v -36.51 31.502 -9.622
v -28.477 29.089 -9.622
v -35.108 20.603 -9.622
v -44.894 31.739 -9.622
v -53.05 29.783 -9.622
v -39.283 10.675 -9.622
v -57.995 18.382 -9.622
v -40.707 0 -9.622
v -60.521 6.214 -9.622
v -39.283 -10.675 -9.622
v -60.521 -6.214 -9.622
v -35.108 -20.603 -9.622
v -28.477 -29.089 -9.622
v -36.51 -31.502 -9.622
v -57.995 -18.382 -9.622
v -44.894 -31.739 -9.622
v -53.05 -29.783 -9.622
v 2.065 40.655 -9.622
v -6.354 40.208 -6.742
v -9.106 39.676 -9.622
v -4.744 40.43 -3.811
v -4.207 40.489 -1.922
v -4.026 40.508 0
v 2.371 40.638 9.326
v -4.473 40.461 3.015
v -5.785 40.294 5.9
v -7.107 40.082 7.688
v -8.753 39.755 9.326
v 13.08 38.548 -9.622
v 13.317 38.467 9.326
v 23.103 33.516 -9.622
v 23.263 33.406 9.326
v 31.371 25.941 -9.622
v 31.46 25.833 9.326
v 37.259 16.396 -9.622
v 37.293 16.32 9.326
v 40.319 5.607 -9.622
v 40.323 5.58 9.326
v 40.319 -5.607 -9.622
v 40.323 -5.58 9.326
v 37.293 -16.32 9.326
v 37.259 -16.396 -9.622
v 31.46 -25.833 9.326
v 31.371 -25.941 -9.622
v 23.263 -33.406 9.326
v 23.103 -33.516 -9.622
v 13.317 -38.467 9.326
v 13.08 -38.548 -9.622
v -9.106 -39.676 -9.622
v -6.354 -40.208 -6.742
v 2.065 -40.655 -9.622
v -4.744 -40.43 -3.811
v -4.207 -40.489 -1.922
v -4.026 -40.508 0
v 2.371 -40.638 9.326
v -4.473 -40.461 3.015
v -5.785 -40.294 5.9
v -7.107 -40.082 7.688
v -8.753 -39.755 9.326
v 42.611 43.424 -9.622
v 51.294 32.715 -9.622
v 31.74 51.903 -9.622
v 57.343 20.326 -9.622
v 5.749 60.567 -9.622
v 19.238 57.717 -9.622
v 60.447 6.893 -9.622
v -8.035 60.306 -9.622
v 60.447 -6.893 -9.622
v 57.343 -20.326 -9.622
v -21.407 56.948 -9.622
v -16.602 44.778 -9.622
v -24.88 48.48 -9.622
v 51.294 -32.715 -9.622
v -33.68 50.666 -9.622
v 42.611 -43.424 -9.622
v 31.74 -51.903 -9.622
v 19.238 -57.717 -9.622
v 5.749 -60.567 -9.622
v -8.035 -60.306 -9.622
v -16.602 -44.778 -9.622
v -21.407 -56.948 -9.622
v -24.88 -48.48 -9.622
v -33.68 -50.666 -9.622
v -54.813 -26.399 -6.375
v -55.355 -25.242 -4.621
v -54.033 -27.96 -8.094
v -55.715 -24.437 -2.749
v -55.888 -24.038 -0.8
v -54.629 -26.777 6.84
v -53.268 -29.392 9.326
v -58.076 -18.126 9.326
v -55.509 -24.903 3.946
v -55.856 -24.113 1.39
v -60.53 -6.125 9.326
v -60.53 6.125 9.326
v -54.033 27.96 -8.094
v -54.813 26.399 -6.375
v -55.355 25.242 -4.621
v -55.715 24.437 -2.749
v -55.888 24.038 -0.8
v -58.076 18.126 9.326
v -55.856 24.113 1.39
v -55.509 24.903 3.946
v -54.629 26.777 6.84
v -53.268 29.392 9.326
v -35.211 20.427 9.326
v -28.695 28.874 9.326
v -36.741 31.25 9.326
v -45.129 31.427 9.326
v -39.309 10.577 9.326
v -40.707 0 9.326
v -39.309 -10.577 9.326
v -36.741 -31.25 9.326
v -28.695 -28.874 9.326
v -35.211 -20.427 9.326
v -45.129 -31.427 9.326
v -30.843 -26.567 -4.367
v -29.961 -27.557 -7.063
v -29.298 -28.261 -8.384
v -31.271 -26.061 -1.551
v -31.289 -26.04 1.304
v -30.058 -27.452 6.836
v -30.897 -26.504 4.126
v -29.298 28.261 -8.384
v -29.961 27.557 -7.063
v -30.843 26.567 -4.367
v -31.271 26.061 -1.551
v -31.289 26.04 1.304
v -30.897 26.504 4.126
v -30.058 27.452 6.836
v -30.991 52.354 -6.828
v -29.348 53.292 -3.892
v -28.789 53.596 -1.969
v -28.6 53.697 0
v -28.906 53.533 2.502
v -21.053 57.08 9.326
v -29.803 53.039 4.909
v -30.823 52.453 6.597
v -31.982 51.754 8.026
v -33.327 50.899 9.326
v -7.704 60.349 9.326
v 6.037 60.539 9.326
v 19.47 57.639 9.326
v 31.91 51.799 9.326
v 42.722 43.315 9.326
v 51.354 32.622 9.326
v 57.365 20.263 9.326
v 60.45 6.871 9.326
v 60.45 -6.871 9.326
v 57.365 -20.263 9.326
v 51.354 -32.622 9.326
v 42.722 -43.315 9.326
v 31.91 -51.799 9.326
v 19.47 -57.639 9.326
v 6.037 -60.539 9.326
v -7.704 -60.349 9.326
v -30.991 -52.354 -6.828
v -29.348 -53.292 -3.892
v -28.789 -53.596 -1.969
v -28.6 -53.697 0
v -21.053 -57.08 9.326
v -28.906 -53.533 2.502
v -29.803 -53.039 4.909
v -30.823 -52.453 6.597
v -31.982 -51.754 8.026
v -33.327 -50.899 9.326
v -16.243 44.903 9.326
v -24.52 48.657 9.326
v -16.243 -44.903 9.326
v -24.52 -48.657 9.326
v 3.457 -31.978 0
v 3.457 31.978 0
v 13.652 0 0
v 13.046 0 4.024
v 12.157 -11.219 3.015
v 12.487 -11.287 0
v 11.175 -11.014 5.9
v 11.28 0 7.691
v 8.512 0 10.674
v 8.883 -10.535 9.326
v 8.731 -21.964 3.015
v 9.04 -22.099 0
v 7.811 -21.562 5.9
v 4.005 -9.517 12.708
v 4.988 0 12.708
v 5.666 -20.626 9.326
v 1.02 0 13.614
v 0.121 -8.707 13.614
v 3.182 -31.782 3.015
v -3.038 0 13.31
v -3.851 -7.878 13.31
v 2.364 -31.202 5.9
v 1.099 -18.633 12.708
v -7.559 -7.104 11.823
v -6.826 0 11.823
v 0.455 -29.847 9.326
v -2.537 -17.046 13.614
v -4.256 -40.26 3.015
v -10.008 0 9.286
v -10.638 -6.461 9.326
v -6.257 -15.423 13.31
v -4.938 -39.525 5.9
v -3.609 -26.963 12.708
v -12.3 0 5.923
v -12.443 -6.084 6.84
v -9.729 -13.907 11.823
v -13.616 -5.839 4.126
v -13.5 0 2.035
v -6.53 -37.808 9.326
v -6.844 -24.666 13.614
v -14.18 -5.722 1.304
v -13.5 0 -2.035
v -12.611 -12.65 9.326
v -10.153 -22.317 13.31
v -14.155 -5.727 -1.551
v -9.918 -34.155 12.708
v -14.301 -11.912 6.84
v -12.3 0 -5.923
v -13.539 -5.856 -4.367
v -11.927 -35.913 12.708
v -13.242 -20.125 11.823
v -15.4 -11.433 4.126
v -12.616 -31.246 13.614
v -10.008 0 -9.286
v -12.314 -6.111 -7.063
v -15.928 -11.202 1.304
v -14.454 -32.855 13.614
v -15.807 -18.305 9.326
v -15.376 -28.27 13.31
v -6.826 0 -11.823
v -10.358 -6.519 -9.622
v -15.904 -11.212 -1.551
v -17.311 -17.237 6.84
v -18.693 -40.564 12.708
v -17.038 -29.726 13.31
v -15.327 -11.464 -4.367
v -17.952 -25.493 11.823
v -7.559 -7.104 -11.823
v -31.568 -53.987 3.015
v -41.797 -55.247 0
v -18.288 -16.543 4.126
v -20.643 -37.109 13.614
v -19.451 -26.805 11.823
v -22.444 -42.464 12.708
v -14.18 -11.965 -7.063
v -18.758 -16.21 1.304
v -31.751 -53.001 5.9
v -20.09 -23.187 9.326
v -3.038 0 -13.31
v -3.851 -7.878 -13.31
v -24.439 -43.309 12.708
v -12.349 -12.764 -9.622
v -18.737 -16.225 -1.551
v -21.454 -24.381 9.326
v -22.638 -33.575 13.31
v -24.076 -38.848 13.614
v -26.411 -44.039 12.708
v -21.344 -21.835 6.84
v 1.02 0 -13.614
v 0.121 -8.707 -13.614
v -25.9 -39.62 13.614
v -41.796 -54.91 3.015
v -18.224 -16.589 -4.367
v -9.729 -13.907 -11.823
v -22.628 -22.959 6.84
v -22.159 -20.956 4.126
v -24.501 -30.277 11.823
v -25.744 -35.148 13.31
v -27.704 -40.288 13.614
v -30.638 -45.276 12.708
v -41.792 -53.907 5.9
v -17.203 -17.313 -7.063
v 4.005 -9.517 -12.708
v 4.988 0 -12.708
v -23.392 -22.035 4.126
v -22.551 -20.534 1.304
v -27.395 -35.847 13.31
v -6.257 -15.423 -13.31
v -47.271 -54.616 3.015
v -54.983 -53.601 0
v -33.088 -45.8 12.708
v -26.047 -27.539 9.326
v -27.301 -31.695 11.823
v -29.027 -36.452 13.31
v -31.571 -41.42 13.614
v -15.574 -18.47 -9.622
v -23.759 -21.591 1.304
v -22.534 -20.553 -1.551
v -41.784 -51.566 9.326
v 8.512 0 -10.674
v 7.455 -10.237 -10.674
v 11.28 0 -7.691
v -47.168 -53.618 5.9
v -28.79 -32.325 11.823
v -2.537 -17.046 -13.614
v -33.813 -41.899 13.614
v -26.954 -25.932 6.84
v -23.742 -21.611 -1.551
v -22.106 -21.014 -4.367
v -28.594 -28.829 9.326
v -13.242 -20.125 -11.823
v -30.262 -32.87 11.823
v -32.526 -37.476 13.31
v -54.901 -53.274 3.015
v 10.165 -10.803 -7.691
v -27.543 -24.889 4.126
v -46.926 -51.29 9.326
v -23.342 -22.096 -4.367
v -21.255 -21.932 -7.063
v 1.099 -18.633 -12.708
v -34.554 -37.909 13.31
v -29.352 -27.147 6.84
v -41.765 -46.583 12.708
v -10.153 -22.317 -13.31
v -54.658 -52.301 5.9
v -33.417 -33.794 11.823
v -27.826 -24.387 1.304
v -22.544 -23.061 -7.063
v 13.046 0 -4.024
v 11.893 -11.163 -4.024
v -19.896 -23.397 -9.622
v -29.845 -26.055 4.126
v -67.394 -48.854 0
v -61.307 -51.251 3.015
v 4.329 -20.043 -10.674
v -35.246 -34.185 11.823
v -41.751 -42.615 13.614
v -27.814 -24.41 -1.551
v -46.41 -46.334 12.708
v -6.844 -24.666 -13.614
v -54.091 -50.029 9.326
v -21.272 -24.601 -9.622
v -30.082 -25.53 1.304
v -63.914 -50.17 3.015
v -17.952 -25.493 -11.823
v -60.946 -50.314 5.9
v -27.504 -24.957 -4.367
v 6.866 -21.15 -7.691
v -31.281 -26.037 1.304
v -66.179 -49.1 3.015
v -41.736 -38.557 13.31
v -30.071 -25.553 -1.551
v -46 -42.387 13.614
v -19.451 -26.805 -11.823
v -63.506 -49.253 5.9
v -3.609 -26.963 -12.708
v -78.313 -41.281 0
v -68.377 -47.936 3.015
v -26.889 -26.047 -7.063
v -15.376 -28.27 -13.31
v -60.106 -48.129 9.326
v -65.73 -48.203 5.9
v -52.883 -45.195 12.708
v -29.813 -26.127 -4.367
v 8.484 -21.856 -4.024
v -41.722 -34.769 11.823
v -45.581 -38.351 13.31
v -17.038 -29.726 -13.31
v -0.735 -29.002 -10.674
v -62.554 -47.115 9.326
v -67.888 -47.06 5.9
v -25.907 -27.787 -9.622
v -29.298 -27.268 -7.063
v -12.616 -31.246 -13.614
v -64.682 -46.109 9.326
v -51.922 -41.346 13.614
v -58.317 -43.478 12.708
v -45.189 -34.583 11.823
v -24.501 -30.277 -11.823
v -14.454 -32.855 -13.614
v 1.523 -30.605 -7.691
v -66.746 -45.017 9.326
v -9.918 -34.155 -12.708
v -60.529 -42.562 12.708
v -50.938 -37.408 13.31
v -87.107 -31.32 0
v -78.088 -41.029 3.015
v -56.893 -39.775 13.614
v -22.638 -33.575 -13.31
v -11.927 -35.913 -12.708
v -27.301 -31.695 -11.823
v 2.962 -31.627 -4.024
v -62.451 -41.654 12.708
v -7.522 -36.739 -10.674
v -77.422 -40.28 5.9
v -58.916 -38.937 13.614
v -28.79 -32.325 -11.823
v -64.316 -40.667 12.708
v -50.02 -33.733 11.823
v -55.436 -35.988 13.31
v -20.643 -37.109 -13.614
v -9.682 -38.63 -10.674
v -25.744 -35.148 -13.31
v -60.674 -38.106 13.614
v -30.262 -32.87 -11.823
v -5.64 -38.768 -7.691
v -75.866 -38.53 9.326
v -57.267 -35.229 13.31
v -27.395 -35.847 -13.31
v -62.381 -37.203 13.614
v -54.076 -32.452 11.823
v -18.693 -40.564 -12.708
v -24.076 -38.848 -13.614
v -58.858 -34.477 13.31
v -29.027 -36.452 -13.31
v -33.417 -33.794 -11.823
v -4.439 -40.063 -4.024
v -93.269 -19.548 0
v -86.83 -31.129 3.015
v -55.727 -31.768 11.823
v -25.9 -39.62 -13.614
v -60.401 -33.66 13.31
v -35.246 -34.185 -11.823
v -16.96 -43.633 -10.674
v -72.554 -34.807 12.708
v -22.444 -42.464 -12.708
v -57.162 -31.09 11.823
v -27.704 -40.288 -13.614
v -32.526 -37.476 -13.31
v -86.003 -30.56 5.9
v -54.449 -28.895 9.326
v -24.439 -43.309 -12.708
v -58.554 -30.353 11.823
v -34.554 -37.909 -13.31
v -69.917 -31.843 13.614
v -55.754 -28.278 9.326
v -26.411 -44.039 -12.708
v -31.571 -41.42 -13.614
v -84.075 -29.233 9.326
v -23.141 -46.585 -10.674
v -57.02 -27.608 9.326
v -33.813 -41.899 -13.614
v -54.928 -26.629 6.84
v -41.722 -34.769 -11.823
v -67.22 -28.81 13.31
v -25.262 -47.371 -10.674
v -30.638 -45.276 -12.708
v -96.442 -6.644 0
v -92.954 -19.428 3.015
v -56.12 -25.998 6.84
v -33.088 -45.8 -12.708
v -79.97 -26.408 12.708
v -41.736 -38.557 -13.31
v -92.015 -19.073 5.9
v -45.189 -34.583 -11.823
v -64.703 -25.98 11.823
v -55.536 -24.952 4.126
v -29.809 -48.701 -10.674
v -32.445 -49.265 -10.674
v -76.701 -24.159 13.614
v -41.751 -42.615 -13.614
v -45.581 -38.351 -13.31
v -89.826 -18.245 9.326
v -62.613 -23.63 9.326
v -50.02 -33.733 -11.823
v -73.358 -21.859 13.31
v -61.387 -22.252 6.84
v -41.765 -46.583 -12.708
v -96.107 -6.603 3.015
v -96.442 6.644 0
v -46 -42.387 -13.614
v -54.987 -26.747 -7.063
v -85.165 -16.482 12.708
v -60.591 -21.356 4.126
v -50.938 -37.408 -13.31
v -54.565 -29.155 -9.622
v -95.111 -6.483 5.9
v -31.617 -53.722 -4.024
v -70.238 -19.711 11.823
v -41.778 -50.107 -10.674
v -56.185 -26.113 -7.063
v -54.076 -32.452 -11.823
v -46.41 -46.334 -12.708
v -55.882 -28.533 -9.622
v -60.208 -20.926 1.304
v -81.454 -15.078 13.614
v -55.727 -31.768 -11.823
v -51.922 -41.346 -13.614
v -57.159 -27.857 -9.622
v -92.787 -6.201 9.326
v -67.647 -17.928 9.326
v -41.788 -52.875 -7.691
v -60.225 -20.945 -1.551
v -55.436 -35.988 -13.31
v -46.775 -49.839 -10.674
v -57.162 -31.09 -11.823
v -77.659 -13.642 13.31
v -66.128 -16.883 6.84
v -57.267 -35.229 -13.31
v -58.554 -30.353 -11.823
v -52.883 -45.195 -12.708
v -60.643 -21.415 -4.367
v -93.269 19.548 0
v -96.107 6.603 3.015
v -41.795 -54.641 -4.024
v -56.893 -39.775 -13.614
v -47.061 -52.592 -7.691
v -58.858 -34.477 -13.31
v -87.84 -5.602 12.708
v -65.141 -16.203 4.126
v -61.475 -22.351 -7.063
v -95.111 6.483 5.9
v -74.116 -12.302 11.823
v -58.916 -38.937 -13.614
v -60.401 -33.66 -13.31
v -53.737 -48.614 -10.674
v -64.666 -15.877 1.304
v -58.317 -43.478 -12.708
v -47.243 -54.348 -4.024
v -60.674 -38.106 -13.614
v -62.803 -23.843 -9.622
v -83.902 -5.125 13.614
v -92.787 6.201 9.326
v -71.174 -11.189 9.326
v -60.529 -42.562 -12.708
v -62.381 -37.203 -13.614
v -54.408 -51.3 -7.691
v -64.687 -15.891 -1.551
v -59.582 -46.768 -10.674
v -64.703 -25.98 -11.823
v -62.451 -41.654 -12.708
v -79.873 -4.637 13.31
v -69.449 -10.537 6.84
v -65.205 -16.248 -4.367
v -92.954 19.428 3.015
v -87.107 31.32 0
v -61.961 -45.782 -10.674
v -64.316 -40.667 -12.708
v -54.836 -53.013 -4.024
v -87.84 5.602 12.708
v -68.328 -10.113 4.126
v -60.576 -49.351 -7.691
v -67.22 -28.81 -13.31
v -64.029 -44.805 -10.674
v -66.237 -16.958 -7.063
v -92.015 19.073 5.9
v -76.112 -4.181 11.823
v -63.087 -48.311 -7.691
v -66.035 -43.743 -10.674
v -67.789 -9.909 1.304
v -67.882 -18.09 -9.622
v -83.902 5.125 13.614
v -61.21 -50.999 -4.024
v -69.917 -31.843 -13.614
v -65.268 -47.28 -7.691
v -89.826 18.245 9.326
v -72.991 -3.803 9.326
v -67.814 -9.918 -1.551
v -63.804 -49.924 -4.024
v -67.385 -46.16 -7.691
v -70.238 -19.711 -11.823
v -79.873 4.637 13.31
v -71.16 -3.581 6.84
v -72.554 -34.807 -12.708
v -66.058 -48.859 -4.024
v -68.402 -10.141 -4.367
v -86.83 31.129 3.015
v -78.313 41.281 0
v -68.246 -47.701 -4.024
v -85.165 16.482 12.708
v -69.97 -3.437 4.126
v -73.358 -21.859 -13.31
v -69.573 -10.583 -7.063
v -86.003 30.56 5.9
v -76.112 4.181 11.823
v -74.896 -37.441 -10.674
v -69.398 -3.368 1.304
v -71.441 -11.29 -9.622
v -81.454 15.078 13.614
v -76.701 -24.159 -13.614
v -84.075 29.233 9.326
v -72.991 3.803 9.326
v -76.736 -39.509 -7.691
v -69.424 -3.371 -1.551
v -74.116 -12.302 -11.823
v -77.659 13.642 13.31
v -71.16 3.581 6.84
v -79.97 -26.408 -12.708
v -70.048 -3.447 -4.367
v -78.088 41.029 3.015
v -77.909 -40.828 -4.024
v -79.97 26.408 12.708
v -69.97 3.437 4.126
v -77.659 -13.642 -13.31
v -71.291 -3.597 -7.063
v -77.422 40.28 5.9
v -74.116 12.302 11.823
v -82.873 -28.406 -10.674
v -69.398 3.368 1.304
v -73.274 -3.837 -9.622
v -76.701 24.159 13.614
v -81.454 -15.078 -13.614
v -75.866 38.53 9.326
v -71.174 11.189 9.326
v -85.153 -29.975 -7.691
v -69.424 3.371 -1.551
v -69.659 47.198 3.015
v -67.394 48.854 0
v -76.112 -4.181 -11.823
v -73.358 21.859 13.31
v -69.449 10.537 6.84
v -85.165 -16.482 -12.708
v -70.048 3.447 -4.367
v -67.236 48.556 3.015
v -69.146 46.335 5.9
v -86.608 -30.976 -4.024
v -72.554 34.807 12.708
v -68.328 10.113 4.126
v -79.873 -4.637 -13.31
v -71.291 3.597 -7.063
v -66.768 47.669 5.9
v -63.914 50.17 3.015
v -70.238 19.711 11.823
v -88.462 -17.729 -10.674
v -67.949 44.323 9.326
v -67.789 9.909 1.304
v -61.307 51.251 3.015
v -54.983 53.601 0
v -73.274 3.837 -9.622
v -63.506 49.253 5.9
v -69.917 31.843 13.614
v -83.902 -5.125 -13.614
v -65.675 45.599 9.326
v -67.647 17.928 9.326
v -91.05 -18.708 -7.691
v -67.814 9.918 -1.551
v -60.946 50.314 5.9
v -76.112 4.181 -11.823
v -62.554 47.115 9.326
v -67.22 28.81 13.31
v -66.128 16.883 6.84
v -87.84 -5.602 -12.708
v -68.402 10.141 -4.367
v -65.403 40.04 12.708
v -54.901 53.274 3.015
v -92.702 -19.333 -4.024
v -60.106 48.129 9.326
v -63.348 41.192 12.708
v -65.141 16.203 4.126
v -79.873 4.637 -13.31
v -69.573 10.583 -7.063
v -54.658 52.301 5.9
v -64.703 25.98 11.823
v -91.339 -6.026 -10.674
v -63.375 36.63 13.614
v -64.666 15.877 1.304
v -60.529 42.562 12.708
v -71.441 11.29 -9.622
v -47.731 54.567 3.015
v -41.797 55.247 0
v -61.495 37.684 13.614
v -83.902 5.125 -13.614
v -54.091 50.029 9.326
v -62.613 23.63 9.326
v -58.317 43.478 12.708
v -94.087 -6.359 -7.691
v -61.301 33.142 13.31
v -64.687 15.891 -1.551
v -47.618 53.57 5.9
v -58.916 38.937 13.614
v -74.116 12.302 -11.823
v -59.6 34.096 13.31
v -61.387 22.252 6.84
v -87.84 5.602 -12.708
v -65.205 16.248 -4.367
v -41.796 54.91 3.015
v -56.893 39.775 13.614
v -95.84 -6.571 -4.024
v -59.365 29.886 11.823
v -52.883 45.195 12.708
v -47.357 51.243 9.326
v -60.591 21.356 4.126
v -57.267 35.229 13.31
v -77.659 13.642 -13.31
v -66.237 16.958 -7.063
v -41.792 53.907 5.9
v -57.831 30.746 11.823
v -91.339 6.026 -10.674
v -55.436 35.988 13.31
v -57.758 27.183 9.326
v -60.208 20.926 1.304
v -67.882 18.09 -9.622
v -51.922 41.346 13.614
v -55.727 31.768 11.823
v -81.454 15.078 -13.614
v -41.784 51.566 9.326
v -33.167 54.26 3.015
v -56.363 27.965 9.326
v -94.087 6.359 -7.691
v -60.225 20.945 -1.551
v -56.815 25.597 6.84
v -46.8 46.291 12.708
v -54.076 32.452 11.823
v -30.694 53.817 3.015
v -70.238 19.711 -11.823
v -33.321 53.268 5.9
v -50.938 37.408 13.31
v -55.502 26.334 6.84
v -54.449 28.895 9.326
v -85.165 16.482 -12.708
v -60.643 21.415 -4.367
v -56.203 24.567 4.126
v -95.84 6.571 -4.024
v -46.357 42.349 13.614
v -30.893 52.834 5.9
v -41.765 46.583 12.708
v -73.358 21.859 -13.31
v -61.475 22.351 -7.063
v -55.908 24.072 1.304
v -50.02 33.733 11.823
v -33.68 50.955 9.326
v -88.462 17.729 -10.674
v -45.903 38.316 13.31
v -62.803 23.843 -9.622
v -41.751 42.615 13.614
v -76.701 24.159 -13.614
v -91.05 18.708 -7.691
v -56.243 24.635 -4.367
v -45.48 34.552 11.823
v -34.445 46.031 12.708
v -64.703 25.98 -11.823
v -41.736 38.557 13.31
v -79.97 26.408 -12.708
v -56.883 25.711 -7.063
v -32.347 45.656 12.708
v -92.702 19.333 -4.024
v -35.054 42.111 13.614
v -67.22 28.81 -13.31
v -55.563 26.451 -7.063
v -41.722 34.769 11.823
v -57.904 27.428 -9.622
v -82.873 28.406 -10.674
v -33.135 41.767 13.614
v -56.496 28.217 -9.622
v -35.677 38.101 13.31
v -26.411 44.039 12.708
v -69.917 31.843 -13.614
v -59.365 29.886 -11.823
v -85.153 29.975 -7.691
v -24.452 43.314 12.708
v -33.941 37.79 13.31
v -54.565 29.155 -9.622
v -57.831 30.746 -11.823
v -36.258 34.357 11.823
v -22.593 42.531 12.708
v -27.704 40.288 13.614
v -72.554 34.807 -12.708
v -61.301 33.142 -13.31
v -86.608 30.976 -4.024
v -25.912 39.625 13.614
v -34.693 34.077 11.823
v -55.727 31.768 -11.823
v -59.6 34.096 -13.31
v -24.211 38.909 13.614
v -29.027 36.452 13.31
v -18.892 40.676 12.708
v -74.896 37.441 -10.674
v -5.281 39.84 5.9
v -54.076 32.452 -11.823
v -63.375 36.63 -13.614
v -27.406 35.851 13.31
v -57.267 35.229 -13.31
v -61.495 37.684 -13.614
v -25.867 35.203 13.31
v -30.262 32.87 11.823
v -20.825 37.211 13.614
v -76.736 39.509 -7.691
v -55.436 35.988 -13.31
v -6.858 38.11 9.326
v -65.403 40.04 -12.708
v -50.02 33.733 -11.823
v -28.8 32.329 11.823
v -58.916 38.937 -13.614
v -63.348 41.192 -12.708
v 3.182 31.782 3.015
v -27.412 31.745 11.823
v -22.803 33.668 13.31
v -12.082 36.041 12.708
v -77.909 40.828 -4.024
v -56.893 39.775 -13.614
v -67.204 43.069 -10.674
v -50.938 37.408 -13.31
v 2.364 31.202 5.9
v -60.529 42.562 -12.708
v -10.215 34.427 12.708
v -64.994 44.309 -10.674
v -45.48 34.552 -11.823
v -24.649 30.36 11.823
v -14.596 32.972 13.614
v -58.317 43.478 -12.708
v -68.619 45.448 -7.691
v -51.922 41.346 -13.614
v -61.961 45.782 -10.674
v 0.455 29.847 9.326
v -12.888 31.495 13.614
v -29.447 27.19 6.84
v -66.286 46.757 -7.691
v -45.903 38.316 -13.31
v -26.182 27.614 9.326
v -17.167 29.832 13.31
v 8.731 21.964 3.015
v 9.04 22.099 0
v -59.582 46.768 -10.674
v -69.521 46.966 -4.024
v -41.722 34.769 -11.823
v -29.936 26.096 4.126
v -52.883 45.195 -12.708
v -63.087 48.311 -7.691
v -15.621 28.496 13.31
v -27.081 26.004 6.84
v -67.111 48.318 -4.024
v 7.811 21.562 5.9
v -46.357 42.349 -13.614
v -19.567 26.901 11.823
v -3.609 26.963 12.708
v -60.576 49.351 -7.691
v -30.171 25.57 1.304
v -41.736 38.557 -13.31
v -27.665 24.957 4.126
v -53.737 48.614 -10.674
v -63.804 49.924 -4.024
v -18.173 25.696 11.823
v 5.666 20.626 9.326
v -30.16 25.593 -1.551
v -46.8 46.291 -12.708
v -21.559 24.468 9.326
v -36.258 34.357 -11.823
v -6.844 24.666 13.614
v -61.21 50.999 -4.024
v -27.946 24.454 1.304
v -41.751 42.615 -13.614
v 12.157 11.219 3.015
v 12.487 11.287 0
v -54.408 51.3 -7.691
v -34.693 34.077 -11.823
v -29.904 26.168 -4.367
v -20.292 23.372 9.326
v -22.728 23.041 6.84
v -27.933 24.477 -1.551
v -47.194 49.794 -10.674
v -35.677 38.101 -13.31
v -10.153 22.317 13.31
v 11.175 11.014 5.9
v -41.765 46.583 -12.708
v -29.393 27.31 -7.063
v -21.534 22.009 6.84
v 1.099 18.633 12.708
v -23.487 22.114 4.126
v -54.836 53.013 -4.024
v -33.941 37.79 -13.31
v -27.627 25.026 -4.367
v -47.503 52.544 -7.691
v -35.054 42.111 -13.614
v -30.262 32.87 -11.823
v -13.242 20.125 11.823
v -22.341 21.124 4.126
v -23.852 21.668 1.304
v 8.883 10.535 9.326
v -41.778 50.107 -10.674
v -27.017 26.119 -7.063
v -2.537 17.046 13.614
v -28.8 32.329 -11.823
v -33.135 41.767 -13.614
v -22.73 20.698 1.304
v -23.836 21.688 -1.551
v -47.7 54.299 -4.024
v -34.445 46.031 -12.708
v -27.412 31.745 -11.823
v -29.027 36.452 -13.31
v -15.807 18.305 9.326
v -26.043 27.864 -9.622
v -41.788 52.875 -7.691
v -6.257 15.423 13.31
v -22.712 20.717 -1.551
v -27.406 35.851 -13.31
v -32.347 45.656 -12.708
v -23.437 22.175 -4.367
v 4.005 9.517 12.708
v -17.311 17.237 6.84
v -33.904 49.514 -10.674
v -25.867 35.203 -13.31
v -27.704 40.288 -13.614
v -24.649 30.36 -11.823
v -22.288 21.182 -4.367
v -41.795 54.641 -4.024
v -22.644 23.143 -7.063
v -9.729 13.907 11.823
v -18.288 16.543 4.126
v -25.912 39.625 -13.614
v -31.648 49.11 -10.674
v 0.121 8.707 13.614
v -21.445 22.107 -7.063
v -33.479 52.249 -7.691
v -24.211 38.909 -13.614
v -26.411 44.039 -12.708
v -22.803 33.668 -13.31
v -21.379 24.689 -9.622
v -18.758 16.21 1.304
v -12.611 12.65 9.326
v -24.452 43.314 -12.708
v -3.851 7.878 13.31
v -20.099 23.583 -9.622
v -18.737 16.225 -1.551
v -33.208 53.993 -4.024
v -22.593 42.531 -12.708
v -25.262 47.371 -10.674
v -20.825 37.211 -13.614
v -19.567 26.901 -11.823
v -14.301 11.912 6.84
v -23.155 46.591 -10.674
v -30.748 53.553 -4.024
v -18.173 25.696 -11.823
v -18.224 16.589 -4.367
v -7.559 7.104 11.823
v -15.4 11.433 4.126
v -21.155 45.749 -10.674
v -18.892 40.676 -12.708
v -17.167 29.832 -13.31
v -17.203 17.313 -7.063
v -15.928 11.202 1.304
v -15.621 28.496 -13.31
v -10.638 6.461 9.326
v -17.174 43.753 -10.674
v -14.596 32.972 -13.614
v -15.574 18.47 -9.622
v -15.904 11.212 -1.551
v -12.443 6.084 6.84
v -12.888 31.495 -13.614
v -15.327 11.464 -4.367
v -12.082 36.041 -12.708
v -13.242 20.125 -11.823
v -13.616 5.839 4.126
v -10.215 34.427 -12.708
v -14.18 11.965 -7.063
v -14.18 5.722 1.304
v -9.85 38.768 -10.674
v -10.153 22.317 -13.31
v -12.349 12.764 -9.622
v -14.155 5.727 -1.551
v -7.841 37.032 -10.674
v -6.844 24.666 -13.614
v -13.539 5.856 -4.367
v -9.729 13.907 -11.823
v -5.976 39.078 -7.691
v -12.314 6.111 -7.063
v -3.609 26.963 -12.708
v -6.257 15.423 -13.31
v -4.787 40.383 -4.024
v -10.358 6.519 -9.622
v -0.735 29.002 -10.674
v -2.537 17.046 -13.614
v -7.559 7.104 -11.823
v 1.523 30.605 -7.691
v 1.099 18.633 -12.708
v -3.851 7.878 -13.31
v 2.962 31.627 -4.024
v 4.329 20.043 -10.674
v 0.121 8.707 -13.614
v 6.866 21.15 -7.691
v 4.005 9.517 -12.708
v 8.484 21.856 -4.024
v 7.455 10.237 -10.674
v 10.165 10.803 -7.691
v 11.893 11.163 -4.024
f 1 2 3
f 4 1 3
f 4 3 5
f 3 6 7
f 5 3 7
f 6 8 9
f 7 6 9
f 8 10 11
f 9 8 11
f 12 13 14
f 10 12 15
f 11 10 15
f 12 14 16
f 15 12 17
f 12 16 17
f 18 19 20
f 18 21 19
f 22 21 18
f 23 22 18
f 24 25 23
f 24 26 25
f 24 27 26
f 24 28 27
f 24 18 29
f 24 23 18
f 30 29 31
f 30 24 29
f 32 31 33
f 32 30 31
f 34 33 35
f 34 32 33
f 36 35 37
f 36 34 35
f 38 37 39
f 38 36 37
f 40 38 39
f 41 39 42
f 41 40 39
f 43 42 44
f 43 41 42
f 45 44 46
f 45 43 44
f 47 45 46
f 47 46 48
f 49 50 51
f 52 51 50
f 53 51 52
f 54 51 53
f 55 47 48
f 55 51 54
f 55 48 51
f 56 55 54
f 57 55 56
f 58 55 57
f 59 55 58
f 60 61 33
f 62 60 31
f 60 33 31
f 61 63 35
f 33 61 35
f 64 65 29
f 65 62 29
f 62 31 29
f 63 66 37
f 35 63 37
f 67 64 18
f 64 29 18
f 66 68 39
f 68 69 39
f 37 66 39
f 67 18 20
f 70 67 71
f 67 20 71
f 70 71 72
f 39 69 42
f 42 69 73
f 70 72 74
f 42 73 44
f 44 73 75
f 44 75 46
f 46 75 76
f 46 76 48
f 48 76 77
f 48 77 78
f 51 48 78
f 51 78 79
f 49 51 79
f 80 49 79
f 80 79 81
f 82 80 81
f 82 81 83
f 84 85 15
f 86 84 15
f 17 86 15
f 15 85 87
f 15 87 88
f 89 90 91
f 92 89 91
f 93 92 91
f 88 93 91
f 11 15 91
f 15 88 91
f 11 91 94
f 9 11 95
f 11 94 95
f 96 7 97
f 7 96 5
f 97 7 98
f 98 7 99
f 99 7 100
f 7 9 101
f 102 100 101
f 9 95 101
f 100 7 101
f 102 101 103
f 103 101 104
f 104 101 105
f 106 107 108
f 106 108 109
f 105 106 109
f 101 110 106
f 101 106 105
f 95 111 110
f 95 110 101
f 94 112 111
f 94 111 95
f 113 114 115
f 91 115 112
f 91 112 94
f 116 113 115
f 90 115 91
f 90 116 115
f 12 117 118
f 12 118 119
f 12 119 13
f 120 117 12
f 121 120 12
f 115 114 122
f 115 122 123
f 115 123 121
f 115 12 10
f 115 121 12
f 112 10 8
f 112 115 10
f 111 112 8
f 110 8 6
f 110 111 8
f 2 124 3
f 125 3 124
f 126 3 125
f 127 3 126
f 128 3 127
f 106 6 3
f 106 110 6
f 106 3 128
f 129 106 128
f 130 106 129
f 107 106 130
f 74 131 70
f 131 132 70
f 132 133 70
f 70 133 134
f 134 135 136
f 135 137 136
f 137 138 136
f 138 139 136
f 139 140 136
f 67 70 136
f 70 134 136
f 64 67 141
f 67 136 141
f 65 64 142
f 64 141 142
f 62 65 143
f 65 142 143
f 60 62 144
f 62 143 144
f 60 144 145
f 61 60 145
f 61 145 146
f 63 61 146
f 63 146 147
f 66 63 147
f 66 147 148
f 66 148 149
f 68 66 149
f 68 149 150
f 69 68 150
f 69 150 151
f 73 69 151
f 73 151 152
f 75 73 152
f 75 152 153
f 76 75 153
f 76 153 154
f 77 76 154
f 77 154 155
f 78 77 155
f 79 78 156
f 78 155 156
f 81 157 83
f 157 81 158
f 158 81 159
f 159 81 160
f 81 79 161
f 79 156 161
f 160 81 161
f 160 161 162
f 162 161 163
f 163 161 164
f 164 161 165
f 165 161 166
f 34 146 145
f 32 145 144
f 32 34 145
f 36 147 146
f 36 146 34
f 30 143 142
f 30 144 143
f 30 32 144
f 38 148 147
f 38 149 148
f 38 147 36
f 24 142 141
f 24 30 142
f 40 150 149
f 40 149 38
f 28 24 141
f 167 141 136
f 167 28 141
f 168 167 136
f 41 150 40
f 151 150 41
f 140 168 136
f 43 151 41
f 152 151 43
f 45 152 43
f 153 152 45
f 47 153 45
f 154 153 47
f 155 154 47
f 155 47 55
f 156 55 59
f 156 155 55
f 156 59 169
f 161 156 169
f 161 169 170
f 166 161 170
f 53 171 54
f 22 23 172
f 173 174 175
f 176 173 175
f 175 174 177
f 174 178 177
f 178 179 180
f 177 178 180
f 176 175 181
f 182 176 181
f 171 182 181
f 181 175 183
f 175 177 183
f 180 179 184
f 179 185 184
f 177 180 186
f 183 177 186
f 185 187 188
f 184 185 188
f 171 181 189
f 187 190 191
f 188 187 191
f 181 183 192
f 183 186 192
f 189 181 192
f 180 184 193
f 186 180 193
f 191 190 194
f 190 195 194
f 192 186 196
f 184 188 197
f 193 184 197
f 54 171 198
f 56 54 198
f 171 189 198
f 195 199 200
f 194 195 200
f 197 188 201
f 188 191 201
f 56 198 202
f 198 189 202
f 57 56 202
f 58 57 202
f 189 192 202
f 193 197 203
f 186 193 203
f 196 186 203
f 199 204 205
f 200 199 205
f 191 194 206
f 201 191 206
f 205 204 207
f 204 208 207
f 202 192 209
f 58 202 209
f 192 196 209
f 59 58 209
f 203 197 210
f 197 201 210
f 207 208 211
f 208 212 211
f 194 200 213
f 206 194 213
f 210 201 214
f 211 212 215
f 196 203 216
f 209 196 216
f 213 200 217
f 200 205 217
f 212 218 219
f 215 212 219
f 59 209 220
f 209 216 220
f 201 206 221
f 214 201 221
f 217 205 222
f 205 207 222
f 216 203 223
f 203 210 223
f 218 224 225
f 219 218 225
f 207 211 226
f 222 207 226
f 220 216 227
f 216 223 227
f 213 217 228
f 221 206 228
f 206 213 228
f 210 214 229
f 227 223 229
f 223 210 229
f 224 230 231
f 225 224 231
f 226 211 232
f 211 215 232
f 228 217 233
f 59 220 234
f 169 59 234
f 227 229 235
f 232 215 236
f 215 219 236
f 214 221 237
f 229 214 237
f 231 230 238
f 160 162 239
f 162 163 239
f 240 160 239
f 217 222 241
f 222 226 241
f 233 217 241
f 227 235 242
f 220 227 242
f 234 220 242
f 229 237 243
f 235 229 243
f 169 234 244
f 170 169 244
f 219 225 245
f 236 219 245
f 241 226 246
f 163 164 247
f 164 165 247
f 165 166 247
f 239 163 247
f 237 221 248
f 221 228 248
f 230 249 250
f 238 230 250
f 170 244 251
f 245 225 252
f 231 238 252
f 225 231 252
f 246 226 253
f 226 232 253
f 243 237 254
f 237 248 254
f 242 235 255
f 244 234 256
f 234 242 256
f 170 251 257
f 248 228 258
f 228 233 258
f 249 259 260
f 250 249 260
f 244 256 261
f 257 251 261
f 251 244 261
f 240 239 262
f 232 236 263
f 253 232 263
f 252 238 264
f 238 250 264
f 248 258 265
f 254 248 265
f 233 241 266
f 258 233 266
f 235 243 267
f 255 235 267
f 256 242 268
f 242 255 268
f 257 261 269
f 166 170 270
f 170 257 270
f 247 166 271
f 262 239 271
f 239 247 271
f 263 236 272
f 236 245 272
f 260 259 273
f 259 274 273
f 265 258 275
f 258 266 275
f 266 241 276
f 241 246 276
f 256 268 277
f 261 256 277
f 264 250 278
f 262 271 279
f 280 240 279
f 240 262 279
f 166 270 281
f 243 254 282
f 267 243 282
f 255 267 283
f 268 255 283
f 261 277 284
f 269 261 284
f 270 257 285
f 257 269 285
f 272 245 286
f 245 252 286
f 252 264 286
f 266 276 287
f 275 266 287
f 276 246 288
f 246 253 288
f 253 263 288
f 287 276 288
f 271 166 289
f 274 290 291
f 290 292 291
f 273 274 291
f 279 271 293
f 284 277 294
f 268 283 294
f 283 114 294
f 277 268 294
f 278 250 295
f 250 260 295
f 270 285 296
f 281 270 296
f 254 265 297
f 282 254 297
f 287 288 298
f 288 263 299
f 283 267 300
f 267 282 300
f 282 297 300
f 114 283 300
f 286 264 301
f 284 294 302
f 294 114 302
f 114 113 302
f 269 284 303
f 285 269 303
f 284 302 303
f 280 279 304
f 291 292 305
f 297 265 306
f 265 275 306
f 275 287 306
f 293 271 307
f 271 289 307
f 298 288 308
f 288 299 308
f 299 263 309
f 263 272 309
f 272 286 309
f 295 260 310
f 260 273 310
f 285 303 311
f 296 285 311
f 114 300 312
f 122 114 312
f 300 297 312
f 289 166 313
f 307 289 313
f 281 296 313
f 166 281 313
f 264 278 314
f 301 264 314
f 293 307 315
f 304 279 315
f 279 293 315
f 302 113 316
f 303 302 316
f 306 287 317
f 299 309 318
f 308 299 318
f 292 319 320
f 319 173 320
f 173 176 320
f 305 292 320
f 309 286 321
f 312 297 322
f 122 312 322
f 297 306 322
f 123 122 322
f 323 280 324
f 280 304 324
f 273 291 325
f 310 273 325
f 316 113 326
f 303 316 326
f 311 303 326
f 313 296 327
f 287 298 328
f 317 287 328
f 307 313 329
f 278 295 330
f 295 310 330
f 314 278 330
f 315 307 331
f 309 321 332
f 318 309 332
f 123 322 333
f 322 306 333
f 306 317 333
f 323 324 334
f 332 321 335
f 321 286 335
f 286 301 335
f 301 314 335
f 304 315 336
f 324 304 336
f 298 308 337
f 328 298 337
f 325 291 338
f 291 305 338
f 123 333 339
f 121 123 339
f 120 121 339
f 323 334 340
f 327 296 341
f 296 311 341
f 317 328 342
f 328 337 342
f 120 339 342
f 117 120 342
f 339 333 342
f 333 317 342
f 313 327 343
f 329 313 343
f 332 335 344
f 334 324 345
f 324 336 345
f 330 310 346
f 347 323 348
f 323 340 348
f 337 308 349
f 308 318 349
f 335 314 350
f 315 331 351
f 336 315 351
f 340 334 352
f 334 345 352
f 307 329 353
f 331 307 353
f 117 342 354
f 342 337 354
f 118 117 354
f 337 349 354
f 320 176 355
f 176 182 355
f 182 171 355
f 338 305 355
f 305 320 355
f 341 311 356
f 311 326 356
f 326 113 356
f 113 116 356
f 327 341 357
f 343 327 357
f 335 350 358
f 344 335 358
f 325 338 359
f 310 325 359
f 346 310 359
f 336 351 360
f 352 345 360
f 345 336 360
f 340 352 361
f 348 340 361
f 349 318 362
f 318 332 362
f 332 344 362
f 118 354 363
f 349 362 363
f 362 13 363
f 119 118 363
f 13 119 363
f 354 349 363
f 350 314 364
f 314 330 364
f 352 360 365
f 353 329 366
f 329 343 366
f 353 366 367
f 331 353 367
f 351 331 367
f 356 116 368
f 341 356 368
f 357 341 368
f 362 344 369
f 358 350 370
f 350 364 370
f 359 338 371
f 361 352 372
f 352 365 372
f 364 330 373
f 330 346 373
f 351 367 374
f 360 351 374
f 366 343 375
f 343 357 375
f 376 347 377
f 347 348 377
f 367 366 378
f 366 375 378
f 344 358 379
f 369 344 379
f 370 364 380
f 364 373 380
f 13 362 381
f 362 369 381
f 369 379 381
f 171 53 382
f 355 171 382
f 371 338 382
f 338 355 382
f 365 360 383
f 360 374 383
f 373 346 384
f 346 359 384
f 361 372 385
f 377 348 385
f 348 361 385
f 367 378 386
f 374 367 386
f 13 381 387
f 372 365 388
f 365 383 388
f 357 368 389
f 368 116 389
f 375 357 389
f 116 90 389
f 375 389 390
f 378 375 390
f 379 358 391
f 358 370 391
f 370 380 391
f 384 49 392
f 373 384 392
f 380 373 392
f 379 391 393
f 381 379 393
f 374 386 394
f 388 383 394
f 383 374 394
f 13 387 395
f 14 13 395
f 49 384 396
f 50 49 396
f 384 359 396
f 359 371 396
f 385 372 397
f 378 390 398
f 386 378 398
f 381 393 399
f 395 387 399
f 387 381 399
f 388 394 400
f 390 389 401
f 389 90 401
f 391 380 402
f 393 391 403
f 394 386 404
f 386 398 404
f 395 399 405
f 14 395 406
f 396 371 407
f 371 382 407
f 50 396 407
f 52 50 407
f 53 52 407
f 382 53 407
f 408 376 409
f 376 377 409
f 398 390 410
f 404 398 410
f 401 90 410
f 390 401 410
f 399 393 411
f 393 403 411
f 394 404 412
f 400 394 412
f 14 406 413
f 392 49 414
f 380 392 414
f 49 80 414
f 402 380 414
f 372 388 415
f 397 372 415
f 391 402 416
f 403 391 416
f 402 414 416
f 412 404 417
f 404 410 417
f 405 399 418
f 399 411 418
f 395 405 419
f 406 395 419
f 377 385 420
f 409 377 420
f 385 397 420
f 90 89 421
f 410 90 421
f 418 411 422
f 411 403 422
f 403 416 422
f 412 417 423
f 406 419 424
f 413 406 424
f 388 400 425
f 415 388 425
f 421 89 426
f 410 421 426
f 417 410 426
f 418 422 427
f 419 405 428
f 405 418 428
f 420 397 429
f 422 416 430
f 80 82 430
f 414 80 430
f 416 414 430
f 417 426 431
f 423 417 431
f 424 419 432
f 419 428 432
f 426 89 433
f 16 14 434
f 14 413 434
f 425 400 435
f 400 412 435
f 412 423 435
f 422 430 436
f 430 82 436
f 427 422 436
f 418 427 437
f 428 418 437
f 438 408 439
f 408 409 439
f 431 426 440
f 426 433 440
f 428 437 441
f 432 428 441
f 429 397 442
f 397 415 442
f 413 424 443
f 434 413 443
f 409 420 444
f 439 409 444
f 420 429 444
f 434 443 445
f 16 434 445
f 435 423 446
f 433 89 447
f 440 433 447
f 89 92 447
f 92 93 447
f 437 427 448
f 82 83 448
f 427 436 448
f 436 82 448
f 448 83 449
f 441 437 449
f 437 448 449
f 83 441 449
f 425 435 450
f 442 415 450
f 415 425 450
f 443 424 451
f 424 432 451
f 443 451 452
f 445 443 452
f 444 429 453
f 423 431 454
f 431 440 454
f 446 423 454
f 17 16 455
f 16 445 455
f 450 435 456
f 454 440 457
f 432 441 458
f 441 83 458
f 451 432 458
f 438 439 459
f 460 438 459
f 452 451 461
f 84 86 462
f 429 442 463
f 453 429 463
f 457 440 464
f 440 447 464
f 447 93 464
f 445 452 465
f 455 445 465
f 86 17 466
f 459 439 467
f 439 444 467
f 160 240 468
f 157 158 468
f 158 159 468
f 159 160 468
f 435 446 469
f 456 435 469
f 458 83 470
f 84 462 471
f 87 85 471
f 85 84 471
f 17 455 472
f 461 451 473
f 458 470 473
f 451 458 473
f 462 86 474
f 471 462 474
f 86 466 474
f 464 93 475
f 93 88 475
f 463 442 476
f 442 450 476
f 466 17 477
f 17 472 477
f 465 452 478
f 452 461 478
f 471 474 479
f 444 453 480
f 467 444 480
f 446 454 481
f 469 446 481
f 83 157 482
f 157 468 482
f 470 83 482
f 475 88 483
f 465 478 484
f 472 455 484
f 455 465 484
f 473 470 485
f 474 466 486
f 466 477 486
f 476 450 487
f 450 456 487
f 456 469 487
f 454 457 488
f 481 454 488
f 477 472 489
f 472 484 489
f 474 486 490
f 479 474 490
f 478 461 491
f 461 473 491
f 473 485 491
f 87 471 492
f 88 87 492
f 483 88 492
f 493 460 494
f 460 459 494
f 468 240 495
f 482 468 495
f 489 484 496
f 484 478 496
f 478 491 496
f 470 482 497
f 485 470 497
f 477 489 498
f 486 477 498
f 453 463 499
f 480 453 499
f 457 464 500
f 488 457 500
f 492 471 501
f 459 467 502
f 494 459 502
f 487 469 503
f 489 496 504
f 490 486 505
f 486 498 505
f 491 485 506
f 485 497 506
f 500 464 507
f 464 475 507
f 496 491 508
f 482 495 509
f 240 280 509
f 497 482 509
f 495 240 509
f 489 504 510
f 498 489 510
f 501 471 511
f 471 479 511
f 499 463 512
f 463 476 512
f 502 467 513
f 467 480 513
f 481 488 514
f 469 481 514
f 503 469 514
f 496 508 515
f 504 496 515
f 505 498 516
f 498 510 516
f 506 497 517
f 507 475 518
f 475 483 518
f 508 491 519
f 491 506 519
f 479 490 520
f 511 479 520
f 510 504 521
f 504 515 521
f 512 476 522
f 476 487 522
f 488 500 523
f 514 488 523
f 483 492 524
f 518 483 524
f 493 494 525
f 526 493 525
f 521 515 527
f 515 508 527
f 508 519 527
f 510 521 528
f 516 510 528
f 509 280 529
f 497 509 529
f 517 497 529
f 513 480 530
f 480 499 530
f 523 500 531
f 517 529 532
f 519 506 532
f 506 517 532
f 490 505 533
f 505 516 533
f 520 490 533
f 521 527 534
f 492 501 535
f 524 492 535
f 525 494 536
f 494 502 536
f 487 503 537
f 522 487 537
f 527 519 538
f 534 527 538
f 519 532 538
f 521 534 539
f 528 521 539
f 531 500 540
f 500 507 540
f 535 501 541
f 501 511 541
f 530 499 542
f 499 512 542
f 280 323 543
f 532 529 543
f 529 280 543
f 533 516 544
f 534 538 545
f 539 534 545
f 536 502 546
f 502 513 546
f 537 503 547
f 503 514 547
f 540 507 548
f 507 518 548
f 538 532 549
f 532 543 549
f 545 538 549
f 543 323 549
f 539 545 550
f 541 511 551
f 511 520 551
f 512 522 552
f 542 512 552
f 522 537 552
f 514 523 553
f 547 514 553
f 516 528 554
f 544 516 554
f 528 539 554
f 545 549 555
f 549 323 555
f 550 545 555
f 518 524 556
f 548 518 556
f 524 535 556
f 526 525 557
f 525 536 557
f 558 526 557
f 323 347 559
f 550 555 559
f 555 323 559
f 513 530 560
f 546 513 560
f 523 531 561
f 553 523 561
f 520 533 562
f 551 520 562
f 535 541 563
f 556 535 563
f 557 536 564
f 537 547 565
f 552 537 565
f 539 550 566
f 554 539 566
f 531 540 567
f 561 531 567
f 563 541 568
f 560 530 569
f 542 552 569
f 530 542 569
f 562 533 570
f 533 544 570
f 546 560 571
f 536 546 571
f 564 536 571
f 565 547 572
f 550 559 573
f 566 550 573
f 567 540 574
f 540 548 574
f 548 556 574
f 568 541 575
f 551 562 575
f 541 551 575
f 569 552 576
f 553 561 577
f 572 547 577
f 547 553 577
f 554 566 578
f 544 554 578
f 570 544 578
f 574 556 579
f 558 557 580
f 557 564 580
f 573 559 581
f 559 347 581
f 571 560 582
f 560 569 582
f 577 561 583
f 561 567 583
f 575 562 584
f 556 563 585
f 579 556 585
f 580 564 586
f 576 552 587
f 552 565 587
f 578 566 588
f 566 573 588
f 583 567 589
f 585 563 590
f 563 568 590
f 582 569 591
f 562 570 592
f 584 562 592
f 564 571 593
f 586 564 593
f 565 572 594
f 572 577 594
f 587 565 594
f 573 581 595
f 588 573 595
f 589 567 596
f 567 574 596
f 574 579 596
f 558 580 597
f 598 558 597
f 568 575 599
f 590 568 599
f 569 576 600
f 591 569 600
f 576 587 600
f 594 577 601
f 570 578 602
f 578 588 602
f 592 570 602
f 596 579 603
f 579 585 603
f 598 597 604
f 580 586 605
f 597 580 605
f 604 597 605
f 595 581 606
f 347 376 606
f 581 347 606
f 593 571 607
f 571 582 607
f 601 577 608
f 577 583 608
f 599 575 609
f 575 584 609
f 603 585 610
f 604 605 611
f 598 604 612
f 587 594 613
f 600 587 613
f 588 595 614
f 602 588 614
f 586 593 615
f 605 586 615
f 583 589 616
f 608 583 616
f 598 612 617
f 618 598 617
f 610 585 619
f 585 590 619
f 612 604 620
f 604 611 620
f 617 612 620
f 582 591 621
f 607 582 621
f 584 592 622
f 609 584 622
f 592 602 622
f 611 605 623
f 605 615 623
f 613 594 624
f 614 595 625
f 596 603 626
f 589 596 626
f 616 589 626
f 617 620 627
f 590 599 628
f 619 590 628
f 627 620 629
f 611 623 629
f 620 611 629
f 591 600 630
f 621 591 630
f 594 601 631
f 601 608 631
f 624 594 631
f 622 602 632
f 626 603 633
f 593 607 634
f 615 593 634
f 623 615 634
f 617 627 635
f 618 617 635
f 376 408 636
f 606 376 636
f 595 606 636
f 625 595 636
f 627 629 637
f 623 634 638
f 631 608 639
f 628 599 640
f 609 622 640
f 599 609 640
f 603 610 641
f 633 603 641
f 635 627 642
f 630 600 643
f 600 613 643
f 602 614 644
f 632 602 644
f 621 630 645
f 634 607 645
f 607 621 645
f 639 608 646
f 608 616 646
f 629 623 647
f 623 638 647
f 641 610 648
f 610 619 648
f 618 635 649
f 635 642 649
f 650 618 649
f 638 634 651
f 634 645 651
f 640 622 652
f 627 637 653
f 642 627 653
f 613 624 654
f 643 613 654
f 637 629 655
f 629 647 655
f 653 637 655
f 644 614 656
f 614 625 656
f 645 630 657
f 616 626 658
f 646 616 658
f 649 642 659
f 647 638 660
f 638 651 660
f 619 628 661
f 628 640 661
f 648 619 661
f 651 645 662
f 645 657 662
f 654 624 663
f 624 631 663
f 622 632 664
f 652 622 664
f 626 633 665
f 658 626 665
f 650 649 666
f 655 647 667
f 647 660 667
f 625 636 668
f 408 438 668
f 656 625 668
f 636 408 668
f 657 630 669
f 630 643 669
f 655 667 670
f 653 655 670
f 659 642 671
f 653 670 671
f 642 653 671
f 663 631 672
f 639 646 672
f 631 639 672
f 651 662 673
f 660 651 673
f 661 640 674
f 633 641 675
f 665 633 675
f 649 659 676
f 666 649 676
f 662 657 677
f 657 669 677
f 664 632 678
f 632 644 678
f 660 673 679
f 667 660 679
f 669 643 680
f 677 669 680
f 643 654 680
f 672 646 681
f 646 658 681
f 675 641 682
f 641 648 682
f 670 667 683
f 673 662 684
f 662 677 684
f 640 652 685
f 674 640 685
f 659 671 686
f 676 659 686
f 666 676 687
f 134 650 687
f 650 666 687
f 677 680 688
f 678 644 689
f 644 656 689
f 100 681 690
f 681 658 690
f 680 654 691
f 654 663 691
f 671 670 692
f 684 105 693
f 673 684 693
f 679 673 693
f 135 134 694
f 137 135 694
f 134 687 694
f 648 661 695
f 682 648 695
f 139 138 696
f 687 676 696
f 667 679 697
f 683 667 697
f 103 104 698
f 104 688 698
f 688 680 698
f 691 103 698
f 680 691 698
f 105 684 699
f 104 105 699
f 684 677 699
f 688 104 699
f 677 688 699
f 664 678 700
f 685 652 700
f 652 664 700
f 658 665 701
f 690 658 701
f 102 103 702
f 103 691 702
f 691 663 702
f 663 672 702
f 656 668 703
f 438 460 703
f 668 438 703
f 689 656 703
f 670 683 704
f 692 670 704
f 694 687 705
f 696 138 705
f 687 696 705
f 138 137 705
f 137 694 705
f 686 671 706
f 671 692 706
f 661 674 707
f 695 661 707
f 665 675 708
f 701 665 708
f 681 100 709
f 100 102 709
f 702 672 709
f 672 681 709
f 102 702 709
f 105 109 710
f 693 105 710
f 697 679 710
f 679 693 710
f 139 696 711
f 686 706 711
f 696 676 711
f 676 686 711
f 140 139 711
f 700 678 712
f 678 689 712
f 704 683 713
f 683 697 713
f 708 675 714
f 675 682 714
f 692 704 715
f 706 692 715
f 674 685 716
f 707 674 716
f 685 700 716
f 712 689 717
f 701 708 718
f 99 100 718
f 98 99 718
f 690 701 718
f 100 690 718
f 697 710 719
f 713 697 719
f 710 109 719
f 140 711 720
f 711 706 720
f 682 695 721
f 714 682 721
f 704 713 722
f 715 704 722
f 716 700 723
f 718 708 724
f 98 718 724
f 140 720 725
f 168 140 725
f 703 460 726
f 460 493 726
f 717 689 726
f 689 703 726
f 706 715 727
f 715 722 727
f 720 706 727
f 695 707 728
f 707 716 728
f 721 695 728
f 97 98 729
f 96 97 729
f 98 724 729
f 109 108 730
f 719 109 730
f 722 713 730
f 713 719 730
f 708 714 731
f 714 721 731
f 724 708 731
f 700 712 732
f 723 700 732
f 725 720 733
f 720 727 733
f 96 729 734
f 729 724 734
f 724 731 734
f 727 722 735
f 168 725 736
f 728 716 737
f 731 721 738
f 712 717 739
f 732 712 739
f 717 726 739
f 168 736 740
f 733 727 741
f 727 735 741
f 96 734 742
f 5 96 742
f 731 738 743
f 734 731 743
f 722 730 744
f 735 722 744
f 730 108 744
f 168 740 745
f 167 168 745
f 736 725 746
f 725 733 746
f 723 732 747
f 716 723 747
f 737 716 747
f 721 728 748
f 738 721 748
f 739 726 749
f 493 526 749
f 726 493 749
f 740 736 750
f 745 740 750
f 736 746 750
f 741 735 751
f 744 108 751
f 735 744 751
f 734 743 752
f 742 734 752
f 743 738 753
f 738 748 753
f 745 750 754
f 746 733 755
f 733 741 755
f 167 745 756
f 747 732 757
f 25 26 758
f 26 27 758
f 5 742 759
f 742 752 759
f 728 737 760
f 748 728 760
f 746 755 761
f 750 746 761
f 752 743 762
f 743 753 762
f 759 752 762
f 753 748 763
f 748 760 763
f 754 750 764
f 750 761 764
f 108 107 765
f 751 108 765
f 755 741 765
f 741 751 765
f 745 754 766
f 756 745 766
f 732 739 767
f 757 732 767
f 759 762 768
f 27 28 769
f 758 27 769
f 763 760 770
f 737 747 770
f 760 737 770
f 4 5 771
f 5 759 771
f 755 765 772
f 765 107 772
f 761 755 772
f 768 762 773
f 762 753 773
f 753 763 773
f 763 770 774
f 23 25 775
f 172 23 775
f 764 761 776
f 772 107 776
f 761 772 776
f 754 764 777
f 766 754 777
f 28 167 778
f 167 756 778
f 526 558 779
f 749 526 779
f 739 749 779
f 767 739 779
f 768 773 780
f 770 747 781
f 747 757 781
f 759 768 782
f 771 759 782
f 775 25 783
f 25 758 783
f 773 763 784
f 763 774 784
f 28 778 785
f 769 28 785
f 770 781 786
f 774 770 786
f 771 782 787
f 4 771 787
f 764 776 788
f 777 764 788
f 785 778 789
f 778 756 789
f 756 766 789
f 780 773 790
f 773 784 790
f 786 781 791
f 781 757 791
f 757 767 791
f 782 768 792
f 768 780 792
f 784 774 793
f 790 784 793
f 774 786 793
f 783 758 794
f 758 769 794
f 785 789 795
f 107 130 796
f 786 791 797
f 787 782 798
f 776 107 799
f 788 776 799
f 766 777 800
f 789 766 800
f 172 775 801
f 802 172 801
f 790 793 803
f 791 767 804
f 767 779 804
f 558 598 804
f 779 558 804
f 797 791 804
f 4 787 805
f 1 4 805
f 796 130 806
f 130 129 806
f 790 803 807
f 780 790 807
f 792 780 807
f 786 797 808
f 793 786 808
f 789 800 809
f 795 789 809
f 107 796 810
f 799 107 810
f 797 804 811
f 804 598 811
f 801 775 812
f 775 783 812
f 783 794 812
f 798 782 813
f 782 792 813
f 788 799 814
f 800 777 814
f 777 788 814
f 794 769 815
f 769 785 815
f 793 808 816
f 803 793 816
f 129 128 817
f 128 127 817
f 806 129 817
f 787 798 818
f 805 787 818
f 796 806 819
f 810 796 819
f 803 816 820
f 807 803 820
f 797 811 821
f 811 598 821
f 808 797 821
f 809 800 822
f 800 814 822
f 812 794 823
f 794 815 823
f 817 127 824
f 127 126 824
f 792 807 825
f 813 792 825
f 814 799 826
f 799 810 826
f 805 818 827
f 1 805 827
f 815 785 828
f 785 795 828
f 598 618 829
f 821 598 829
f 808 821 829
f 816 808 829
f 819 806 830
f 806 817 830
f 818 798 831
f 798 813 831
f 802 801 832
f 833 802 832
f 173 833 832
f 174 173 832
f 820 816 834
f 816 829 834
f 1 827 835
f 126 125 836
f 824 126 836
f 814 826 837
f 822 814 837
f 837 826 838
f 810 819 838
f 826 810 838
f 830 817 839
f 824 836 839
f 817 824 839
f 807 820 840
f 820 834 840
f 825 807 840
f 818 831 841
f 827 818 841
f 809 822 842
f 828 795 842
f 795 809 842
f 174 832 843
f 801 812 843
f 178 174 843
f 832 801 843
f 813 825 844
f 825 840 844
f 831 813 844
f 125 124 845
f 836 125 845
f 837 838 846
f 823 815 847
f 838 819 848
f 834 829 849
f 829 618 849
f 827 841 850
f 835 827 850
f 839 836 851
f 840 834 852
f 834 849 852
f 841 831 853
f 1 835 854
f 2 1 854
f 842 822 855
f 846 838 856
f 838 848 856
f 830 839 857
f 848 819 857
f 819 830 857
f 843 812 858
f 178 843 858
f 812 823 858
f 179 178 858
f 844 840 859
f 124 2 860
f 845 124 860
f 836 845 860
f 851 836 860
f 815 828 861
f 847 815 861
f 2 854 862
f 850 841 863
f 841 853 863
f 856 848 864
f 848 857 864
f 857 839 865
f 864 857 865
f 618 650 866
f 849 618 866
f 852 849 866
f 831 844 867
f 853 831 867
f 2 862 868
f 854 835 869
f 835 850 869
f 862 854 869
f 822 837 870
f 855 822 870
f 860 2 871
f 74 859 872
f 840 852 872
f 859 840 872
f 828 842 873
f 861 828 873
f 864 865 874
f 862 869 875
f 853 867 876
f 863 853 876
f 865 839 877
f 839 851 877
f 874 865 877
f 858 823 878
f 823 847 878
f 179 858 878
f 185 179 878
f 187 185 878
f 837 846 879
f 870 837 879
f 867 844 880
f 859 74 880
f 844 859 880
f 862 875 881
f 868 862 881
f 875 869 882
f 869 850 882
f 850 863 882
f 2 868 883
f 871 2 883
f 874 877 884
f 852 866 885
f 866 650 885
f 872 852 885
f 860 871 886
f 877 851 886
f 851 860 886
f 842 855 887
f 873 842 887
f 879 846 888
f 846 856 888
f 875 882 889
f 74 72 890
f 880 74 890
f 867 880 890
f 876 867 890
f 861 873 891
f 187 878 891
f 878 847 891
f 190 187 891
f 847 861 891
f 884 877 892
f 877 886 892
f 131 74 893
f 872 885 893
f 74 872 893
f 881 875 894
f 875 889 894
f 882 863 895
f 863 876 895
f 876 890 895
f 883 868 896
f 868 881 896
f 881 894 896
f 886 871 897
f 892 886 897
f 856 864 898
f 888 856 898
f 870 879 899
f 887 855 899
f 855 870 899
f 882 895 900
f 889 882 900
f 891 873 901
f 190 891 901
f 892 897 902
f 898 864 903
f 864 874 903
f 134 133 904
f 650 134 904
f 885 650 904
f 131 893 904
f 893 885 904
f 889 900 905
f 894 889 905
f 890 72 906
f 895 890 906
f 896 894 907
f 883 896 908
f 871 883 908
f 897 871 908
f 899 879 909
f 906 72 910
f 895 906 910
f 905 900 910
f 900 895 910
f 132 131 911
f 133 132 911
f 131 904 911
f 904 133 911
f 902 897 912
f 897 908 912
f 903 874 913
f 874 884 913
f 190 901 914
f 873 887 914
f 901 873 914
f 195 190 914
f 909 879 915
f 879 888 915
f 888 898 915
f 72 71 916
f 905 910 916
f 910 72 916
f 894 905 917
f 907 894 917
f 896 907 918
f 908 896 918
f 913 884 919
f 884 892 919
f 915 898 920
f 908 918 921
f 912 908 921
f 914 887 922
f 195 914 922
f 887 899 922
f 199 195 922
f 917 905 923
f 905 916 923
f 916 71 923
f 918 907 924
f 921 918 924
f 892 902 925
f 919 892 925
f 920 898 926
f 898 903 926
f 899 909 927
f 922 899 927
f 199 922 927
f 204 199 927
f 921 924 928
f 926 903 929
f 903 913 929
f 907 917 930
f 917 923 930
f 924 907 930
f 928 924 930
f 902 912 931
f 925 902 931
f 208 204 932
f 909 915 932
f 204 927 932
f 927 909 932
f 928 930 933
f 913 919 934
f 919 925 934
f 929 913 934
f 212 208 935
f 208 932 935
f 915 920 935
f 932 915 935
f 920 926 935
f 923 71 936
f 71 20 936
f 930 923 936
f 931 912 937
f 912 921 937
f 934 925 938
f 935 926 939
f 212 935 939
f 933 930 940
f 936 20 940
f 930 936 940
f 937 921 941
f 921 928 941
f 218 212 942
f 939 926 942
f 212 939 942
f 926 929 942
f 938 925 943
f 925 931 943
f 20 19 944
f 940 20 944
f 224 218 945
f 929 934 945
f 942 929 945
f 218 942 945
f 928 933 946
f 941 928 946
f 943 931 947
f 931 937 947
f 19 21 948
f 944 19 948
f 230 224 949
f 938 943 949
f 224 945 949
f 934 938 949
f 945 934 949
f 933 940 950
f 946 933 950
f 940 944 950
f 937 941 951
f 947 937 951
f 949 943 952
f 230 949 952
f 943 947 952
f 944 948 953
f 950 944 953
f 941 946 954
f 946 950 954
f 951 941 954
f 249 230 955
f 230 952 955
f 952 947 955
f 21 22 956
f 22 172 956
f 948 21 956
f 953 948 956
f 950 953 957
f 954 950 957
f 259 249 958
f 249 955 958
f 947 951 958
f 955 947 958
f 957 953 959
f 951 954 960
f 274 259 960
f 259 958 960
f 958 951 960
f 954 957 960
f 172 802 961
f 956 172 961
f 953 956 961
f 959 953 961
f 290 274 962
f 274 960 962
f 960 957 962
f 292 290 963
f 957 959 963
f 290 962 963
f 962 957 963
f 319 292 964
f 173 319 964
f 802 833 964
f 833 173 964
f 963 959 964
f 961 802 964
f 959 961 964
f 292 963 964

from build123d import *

# Parameters (mm, degrees)
F0_W = 20.131584
F0_H = 18.94737
F2_R = 13.652167


with BuildPart() as f1:
    # F0 (on Front) → F1 (revolve)
    with BuildSketch(Plane.XZ):
        with Locations((50.77303, -0.148026)):
            Rectangle(F0_W, F0_H)
    revolve(axis=Axis((0, 0, 10.06579), (0, 0, -1)))

    # F2 (on Front) → F3 (revolve)
    with BuildSketch(Plane.XZ):
        Circle(F2_R)
    revolve(axis=Axis((-41.595396, 0, 5.773026), (0, 0, -1)))


solid = f1.part
